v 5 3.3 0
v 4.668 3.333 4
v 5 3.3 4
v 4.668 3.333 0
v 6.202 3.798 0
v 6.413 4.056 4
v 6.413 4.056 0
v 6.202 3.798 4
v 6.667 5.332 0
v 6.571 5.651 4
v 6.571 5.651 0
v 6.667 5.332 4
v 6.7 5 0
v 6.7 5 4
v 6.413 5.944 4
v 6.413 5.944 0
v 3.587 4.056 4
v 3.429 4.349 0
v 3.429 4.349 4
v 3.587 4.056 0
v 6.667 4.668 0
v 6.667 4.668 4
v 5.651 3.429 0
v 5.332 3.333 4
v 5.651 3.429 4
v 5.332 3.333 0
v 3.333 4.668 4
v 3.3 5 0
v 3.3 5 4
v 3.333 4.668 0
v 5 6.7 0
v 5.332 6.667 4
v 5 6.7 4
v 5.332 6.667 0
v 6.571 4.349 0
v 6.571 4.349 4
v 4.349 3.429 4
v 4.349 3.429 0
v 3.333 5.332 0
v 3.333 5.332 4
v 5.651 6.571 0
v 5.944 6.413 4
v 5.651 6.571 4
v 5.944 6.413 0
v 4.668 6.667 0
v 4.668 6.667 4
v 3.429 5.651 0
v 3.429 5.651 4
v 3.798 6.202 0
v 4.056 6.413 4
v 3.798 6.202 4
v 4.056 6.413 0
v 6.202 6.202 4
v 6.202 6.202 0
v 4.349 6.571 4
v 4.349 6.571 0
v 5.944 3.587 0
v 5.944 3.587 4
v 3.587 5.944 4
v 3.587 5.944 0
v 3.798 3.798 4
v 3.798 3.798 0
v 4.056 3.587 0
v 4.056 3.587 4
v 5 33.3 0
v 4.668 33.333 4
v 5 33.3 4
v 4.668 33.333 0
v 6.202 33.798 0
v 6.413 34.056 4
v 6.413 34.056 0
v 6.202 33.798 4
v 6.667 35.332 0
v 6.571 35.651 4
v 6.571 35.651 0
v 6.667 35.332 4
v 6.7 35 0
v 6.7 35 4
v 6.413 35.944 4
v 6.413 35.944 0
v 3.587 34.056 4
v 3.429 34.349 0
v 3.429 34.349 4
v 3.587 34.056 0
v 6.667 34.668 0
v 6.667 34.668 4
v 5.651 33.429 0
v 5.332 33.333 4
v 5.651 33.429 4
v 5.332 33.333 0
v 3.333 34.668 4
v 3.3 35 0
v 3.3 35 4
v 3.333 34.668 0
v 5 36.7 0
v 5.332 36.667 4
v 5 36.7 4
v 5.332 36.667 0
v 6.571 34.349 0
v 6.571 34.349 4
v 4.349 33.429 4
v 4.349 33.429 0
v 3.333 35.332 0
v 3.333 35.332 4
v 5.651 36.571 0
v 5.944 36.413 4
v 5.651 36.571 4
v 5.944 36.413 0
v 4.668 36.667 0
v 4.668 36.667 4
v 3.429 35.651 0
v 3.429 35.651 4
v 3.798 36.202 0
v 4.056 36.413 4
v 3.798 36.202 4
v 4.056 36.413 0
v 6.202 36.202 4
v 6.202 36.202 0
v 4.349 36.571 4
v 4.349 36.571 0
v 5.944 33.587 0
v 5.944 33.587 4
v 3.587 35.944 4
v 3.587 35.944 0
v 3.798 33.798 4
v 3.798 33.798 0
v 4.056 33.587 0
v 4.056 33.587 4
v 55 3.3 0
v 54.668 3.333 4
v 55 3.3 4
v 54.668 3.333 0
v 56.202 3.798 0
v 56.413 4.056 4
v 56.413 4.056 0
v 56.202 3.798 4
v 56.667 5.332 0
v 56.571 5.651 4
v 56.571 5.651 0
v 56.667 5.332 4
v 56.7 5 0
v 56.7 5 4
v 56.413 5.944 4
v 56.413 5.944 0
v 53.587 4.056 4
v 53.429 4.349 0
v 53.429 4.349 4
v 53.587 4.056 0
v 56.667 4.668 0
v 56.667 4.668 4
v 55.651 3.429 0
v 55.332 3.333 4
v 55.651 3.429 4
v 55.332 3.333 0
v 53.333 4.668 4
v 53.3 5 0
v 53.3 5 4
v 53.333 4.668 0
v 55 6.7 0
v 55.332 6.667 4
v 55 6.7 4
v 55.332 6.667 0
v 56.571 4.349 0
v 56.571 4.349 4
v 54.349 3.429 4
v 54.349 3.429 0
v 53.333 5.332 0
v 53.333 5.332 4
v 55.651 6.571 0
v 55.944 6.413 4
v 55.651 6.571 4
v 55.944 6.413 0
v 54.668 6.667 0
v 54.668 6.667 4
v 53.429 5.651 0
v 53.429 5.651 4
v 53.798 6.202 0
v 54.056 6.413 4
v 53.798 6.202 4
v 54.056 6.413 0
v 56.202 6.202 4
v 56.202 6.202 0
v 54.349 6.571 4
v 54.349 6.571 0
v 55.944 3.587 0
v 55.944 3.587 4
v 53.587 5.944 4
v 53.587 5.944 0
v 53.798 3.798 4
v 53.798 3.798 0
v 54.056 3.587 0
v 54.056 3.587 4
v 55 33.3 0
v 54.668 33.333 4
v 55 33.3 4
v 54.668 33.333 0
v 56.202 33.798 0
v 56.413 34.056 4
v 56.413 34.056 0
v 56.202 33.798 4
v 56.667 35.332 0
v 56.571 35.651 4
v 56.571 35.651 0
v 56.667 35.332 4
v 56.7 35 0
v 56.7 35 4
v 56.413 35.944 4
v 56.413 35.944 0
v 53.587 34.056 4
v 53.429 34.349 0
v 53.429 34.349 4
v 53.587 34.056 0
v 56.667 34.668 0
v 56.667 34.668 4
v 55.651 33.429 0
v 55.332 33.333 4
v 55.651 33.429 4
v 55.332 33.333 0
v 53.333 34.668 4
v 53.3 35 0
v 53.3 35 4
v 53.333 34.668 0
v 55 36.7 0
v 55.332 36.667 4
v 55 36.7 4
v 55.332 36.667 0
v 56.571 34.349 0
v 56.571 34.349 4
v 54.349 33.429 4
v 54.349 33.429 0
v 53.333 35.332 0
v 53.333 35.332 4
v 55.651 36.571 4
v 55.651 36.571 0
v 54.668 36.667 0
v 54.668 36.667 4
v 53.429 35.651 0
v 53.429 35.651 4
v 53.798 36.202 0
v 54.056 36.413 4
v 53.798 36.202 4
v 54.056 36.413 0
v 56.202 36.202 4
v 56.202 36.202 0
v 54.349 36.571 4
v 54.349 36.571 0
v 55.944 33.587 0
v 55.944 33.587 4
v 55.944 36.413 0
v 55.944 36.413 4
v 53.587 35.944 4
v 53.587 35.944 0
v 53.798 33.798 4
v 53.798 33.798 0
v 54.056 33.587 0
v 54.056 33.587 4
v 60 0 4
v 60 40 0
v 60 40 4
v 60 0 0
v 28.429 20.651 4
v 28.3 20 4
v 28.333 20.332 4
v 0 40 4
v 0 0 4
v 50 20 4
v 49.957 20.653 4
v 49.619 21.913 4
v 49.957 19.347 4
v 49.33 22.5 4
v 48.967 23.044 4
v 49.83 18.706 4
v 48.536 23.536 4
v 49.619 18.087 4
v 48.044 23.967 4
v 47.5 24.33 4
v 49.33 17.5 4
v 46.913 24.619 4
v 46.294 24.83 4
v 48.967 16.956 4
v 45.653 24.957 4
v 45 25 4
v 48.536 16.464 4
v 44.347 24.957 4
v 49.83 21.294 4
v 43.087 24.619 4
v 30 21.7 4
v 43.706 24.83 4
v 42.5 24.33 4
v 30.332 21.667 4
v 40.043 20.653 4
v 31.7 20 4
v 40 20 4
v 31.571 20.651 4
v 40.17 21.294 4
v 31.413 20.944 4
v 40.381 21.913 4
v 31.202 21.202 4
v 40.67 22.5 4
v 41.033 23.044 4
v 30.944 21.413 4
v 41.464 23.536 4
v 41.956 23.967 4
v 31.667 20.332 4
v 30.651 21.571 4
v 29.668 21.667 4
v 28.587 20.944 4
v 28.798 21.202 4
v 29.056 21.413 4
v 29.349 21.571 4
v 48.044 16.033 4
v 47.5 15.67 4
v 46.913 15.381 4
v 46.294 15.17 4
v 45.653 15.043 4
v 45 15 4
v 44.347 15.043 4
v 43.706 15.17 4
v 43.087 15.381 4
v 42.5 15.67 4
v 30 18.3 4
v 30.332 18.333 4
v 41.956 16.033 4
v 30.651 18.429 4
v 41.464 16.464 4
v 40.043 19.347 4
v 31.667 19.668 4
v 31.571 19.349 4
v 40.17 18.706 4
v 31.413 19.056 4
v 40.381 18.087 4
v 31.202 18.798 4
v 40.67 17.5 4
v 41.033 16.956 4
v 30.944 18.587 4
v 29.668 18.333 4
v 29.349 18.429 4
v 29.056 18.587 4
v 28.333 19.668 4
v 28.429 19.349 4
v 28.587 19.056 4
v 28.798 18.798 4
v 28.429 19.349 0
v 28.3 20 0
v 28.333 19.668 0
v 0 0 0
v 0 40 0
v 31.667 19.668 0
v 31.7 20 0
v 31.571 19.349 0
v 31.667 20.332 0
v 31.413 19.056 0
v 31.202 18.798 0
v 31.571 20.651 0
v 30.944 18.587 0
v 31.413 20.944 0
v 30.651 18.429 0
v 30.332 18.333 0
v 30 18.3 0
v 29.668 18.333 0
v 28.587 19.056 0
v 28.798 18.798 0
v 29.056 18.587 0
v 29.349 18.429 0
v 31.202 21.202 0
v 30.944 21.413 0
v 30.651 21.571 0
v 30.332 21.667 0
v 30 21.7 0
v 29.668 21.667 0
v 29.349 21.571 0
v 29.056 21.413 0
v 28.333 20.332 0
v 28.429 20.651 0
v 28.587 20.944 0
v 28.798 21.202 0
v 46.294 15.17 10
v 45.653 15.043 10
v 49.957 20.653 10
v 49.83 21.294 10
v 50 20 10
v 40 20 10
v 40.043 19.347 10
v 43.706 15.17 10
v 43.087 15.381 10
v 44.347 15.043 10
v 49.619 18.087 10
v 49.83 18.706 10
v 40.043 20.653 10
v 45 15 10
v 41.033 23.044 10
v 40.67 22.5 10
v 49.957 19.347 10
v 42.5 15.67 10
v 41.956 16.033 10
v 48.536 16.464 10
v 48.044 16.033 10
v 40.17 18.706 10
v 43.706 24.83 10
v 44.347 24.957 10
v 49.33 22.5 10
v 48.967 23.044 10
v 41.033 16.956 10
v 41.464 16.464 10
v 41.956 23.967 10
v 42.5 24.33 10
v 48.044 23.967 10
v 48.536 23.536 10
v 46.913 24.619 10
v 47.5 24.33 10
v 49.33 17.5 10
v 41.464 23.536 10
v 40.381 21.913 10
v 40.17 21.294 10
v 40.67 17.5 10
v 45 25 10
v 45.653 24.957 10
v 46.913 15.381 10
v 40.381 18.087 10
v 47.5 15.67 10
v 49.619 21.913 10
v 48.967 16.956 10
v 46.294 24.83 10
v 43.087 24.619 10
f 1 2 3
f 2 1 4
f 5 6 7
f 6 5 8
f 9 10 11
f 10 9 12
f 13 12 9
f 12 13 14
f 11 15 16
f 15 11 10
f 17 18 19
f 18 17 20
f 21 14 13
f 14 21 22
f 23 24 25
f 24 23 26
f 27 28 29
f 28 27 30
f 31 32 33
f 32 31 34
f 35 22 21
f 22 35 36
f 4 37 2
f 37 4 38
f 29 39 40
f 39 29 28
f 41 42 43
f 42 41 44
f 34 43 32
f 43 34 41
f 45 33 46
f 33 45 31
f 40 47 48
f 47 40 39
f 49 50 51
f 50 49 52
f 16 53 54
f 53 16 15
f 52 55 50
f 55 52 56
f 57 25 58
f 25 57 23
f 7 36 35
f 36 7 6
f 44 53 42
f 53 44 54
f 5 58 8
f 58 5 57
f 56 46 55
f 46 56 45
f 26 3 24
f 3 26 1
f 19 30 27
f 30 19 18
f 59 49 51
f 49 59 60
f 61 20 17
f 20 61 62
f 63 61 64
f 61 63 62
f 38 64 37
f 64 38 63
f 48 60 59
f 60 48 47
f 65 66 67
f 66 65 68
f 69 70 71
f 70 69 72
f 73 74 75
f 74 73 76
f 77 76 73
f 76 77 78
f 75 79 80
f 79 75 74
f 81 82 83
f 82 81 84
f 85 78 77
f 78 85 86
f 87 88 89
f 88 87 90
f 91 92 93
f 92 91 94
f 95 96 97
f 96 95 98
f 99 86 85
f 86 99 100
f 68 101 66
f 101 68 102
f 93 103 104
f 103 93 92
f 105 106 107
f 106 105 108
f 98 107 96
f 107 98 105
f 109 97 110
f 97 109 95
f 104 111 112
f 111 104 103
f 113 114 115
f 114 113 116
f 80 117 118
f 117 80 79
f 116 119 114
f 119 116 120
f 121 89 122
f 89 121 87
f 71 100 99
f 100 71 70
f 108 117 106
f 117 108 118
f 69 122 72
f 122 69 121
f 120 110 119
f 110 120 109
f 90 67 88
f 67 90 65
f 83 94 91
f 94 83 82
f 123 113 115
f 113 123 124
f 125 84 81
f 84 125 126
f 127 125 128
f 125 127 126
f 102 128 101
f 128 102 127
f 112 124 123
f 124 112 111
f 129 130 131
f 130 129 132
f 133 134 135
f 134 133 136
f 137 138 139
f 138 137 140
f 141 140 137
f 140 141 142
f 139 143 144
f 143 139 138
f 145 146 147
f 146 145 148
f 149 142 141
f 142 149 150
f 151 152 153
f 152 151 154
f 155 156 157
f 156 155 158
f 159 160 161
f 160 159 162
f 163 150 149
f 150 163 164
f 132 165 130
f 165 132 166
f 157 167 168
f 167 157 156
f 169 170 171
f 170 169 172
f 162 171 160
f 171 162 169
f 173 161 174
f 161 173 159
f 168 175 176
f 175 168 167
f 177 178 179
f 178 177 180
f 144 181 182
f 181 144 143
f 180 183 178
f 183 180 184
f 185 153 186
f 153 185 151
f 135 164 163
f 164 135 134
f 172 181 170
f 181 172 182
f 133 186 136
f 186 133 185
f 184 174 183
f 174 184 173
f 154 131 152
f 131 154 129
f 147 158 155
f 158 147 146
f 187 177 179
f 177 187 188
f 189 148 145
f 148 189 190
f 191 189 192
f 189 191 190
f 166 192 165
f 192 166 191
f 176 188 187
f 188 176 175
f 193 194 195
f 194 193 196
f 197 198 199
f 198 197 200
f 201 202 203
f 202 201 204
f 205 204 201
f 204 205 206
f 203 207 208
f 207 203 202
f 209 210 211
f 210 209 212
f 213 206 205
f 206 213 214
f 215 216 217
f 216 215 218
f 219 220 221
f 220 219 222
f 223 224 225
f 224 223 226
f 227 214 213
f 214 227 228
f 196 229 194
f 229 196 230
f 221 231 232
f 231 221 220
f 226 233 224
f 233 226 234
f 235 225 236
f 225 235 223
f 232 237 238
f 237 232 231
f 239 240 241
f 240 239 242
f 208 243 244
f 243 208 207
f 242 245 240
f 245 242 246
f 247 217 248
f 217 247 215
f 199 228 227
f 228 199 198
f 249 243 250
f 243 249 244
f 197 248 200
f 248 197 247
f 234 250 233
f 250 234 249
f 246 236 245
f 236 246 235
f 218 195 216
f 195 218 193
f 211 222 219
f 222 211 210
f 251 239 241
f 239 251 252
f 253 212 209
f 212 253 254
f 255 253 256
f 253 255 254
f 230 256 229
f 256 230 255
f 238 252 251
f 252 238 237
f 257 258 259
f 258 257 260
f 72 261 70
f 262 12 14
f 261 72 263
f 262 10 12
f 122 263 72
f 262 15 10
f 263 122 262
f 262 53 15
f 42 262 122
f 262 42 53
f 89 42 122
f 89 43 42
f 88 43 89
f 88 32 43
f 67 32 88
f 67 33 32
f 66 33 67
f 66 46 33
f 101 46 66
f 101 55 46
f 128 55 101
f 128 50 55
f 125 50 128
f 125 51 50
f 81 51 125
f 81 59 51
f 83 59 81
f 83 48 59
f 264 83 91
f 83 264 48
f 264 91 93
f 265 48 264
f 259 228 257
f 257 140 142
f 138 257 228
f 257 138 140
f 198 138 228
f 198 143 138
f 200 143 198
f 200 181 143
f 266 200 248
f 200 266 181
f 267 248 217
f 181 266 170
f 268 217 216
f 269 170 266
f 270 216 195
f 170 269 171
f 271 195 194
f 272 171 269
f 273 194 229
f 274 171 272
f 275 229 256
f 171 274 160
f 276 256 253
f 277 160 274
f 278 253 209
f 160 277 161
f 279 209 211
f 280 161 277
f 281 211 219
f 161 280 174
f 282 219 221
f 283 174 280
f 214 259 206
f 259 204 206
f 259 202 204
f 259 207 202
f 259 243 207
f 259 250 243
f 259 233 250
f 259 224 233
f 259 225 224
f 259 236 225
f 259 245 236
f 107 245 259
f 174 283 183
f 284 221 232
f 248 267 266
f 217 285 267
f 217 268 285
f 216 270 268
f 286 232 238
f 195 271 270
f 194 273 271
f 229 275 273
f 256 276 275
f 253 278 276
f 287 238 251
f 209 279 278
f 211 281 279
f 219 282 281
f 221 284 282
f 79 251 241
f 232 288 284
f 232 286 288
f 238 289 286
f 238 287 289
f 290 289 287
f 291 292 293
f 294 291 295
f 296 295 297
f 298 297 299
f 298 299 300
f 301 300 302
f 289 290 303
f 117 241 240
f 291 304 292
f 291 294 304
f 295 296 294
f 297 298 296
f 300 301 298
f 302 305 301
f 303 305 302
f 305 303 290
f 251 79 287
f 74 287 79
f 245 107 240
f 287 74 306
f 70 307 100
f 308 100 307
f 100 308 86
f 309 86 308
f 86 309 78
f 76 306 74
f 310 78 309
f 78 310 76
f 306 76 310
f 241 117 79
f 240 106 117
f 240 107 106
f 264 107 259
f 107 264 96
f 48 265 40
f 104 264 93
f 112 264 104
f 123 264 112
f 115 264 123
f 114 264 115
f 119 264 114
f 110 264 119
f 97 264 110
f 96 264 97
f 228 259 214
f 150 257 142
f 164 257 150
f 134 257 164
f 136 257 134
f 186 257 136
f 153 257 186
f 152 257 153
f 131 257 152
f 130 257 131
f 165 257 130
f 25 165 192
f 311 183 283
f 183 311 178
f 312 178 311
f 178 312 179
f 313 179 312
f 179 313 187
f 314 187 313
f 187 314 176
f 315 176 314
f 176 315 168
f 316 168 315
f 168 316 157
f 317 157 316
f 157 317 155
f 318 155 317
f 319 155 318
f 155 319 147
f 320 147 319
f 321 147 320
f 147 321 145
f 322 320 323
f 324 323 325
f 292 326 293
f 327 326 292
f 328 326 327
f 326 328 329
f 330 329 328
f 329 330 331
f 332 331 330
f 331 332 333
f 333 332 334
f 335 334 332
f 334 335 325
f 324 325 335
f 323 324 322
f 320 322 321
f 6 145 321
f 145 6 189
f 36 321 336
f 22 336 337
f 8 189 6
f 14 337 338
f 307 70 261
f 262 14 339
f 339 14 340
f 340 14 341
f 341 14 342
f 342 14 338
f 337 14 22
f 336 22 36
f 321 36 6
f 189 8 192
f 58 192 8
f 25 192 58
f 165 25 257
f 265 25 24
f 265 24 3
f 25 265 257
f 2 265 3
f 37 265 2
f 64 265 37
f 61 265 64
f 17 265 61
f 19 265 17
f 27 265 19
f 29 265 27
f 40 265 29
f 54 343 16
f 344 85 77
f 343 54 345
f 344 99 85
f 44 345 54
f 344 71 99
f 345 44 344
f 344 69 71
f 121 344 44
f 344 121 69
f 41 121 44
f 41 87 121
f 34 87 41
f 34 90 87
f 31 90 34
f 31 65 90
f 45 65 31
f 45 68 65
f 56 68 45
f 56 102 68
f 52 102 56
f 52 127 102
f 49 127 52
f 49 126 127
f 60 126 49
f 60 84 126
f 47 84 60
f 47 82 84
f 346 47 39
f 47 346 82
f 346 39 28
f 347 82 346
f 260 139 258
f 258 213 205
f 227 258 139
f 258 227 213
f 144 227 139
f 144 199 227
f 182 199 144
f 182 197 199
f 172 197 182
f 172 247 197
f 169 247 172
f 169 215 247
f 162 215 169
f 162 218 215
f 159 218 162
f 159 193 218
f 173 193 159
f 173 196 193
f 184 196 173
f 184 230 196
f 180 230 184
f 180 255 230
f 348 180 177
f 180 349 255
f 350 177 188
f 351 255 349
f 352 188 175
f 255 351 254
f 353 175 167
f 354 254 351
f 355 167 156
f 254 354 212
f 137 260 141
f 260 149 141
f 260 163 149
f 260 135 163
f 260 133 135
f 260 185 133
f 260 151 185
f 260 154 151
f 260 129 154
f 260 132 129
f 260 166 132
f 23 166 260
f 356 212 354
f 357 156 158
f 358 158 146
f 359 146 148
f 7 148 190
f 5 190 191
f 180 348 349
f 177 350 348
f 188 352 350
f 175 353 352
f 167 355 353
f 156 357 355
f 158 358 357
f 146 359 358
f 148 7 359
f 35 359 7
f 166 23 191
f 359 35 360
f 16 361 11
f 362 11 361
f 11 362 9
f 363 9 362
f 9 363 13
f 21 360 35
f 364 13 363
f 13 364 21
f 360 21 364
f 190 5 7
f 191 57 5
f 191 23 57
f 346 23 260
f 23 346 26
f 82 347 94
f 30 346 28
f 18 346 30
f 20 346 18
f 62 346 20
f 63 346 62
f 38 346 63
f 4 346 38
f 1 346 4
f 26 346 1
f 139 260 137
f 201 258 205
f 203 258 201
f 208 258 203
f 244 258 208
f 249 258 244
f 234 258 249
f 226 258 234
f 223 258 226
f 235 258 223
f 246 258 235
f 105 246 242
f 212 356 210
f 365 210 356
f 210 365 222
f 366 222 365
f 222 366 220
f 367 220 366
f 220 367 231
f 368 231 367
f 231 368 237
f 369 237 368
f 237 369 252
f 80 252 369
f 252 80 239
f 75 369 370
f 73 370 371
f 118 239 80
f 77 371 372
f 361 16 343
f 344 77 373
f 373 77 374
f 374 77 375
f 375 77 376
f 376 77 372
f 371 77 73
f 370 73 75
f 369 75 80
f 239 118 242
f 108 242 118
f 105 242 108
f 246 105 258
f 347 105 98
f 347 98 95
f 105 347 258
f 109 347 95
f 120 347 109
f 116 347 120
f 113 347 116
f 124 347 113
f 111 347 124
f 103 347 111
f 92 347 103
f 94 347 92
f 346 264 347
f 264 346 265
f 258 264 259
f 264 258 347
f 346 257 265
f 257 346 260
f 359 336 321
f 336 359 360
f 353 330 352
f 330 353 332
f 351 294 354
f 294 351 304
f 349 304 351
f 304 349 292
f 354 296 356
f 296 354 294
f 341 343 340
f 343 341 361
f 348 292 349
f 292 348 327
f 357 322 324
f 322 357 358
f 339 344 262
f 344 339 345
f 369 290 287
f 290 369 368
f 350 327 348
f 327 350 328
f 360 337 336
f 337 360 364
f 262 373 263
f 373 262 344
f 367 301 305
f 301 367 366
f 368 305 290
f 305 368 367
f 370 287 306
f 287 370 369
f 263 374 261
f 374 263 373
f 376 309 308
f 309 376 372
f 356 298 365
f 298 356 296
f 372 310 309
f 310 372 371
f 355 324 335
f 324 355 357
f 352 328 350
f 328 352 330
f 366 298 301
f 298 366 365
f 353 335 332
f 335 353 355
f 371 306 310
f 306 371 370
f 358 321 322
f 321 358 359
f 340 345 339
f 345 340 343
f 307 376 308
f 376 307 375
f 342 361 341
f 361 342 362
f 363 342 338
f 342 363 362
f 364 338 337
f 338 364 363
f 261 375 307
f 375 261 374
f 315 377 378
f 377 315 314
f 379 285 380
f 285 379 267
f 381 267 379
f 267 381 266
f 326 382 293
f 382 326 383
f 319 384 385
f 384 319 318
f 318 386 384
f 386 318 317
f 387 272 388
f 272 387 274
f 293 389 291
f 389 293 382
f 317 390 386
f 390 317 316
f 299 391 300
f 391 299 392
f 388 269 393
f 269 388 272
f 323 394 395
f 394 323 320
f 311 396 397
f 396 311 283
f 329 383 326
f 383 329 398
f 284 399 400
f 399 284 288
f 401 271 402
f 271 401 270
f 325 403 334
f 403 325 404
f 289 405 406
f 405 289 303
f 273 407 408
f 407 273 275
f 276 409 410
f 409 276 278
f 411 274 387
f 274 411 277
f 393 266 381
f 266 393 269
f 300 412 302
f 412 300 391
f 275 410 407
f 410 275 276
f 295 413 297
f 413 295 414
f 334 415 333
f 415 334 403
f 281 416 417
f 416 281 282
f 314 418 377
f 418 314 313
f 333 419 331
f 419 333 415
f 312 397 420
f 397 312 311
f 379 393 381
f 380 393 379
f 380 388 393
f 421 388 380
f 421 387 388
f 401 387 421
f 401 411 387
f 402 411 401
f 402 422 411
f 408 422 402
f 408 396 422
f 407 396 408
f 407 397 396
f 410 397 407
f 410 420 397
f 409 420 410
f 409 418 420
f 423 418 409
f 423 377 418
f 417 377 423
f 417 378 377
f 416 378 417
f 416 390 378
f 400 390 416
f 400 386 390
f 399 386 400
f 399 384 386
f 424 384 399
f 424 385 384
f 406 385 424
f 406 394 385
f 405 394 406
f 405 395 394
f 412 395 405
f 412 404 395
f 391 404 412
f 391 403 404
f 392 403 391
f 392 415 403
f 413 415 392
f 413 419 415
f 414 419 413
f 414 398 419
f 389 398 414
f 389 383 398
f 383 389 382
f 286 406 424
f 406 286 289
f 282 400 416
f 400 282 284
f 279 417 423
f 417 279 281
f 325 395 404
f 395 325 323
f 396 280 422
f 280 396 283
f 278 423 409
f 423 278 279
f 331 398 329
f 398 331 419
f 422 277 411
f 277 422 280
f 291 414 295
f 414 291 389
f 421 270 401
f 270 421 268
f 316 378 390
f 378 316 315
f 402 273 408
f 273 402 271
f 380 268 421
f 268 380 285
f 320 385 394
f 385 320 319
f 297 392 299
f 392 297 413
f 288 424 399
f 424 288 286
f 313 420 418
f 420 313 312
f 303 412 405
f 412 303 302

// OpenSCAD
// Sensor mount plate — millimetres
plate_w = 60;
plate_d = 40;
plate_t = 4;
hole_d  = 3.4;
inset   = 5;
boss_d  = 10;
boss_h  = 6;

difference() {
    cube([plate_w, plate_d, plate_t]);
    for (x = [inset, plate_w - inset])
        for (y = [inset, plate_d - inset])
            translate([x, y, -1]) cylinder(d = hole_d, h = plate_t + 2, $fn = 32);
    translate([plate_w / 2, plate_d / 2, -1]) cylinder(d = hole_d, h = plate_t + 2, $fn = 32);
}
// connector boss
translate([45, 20, plate_t]) cylinder(d = boss_d, h = boss_h, $fn = 48);
